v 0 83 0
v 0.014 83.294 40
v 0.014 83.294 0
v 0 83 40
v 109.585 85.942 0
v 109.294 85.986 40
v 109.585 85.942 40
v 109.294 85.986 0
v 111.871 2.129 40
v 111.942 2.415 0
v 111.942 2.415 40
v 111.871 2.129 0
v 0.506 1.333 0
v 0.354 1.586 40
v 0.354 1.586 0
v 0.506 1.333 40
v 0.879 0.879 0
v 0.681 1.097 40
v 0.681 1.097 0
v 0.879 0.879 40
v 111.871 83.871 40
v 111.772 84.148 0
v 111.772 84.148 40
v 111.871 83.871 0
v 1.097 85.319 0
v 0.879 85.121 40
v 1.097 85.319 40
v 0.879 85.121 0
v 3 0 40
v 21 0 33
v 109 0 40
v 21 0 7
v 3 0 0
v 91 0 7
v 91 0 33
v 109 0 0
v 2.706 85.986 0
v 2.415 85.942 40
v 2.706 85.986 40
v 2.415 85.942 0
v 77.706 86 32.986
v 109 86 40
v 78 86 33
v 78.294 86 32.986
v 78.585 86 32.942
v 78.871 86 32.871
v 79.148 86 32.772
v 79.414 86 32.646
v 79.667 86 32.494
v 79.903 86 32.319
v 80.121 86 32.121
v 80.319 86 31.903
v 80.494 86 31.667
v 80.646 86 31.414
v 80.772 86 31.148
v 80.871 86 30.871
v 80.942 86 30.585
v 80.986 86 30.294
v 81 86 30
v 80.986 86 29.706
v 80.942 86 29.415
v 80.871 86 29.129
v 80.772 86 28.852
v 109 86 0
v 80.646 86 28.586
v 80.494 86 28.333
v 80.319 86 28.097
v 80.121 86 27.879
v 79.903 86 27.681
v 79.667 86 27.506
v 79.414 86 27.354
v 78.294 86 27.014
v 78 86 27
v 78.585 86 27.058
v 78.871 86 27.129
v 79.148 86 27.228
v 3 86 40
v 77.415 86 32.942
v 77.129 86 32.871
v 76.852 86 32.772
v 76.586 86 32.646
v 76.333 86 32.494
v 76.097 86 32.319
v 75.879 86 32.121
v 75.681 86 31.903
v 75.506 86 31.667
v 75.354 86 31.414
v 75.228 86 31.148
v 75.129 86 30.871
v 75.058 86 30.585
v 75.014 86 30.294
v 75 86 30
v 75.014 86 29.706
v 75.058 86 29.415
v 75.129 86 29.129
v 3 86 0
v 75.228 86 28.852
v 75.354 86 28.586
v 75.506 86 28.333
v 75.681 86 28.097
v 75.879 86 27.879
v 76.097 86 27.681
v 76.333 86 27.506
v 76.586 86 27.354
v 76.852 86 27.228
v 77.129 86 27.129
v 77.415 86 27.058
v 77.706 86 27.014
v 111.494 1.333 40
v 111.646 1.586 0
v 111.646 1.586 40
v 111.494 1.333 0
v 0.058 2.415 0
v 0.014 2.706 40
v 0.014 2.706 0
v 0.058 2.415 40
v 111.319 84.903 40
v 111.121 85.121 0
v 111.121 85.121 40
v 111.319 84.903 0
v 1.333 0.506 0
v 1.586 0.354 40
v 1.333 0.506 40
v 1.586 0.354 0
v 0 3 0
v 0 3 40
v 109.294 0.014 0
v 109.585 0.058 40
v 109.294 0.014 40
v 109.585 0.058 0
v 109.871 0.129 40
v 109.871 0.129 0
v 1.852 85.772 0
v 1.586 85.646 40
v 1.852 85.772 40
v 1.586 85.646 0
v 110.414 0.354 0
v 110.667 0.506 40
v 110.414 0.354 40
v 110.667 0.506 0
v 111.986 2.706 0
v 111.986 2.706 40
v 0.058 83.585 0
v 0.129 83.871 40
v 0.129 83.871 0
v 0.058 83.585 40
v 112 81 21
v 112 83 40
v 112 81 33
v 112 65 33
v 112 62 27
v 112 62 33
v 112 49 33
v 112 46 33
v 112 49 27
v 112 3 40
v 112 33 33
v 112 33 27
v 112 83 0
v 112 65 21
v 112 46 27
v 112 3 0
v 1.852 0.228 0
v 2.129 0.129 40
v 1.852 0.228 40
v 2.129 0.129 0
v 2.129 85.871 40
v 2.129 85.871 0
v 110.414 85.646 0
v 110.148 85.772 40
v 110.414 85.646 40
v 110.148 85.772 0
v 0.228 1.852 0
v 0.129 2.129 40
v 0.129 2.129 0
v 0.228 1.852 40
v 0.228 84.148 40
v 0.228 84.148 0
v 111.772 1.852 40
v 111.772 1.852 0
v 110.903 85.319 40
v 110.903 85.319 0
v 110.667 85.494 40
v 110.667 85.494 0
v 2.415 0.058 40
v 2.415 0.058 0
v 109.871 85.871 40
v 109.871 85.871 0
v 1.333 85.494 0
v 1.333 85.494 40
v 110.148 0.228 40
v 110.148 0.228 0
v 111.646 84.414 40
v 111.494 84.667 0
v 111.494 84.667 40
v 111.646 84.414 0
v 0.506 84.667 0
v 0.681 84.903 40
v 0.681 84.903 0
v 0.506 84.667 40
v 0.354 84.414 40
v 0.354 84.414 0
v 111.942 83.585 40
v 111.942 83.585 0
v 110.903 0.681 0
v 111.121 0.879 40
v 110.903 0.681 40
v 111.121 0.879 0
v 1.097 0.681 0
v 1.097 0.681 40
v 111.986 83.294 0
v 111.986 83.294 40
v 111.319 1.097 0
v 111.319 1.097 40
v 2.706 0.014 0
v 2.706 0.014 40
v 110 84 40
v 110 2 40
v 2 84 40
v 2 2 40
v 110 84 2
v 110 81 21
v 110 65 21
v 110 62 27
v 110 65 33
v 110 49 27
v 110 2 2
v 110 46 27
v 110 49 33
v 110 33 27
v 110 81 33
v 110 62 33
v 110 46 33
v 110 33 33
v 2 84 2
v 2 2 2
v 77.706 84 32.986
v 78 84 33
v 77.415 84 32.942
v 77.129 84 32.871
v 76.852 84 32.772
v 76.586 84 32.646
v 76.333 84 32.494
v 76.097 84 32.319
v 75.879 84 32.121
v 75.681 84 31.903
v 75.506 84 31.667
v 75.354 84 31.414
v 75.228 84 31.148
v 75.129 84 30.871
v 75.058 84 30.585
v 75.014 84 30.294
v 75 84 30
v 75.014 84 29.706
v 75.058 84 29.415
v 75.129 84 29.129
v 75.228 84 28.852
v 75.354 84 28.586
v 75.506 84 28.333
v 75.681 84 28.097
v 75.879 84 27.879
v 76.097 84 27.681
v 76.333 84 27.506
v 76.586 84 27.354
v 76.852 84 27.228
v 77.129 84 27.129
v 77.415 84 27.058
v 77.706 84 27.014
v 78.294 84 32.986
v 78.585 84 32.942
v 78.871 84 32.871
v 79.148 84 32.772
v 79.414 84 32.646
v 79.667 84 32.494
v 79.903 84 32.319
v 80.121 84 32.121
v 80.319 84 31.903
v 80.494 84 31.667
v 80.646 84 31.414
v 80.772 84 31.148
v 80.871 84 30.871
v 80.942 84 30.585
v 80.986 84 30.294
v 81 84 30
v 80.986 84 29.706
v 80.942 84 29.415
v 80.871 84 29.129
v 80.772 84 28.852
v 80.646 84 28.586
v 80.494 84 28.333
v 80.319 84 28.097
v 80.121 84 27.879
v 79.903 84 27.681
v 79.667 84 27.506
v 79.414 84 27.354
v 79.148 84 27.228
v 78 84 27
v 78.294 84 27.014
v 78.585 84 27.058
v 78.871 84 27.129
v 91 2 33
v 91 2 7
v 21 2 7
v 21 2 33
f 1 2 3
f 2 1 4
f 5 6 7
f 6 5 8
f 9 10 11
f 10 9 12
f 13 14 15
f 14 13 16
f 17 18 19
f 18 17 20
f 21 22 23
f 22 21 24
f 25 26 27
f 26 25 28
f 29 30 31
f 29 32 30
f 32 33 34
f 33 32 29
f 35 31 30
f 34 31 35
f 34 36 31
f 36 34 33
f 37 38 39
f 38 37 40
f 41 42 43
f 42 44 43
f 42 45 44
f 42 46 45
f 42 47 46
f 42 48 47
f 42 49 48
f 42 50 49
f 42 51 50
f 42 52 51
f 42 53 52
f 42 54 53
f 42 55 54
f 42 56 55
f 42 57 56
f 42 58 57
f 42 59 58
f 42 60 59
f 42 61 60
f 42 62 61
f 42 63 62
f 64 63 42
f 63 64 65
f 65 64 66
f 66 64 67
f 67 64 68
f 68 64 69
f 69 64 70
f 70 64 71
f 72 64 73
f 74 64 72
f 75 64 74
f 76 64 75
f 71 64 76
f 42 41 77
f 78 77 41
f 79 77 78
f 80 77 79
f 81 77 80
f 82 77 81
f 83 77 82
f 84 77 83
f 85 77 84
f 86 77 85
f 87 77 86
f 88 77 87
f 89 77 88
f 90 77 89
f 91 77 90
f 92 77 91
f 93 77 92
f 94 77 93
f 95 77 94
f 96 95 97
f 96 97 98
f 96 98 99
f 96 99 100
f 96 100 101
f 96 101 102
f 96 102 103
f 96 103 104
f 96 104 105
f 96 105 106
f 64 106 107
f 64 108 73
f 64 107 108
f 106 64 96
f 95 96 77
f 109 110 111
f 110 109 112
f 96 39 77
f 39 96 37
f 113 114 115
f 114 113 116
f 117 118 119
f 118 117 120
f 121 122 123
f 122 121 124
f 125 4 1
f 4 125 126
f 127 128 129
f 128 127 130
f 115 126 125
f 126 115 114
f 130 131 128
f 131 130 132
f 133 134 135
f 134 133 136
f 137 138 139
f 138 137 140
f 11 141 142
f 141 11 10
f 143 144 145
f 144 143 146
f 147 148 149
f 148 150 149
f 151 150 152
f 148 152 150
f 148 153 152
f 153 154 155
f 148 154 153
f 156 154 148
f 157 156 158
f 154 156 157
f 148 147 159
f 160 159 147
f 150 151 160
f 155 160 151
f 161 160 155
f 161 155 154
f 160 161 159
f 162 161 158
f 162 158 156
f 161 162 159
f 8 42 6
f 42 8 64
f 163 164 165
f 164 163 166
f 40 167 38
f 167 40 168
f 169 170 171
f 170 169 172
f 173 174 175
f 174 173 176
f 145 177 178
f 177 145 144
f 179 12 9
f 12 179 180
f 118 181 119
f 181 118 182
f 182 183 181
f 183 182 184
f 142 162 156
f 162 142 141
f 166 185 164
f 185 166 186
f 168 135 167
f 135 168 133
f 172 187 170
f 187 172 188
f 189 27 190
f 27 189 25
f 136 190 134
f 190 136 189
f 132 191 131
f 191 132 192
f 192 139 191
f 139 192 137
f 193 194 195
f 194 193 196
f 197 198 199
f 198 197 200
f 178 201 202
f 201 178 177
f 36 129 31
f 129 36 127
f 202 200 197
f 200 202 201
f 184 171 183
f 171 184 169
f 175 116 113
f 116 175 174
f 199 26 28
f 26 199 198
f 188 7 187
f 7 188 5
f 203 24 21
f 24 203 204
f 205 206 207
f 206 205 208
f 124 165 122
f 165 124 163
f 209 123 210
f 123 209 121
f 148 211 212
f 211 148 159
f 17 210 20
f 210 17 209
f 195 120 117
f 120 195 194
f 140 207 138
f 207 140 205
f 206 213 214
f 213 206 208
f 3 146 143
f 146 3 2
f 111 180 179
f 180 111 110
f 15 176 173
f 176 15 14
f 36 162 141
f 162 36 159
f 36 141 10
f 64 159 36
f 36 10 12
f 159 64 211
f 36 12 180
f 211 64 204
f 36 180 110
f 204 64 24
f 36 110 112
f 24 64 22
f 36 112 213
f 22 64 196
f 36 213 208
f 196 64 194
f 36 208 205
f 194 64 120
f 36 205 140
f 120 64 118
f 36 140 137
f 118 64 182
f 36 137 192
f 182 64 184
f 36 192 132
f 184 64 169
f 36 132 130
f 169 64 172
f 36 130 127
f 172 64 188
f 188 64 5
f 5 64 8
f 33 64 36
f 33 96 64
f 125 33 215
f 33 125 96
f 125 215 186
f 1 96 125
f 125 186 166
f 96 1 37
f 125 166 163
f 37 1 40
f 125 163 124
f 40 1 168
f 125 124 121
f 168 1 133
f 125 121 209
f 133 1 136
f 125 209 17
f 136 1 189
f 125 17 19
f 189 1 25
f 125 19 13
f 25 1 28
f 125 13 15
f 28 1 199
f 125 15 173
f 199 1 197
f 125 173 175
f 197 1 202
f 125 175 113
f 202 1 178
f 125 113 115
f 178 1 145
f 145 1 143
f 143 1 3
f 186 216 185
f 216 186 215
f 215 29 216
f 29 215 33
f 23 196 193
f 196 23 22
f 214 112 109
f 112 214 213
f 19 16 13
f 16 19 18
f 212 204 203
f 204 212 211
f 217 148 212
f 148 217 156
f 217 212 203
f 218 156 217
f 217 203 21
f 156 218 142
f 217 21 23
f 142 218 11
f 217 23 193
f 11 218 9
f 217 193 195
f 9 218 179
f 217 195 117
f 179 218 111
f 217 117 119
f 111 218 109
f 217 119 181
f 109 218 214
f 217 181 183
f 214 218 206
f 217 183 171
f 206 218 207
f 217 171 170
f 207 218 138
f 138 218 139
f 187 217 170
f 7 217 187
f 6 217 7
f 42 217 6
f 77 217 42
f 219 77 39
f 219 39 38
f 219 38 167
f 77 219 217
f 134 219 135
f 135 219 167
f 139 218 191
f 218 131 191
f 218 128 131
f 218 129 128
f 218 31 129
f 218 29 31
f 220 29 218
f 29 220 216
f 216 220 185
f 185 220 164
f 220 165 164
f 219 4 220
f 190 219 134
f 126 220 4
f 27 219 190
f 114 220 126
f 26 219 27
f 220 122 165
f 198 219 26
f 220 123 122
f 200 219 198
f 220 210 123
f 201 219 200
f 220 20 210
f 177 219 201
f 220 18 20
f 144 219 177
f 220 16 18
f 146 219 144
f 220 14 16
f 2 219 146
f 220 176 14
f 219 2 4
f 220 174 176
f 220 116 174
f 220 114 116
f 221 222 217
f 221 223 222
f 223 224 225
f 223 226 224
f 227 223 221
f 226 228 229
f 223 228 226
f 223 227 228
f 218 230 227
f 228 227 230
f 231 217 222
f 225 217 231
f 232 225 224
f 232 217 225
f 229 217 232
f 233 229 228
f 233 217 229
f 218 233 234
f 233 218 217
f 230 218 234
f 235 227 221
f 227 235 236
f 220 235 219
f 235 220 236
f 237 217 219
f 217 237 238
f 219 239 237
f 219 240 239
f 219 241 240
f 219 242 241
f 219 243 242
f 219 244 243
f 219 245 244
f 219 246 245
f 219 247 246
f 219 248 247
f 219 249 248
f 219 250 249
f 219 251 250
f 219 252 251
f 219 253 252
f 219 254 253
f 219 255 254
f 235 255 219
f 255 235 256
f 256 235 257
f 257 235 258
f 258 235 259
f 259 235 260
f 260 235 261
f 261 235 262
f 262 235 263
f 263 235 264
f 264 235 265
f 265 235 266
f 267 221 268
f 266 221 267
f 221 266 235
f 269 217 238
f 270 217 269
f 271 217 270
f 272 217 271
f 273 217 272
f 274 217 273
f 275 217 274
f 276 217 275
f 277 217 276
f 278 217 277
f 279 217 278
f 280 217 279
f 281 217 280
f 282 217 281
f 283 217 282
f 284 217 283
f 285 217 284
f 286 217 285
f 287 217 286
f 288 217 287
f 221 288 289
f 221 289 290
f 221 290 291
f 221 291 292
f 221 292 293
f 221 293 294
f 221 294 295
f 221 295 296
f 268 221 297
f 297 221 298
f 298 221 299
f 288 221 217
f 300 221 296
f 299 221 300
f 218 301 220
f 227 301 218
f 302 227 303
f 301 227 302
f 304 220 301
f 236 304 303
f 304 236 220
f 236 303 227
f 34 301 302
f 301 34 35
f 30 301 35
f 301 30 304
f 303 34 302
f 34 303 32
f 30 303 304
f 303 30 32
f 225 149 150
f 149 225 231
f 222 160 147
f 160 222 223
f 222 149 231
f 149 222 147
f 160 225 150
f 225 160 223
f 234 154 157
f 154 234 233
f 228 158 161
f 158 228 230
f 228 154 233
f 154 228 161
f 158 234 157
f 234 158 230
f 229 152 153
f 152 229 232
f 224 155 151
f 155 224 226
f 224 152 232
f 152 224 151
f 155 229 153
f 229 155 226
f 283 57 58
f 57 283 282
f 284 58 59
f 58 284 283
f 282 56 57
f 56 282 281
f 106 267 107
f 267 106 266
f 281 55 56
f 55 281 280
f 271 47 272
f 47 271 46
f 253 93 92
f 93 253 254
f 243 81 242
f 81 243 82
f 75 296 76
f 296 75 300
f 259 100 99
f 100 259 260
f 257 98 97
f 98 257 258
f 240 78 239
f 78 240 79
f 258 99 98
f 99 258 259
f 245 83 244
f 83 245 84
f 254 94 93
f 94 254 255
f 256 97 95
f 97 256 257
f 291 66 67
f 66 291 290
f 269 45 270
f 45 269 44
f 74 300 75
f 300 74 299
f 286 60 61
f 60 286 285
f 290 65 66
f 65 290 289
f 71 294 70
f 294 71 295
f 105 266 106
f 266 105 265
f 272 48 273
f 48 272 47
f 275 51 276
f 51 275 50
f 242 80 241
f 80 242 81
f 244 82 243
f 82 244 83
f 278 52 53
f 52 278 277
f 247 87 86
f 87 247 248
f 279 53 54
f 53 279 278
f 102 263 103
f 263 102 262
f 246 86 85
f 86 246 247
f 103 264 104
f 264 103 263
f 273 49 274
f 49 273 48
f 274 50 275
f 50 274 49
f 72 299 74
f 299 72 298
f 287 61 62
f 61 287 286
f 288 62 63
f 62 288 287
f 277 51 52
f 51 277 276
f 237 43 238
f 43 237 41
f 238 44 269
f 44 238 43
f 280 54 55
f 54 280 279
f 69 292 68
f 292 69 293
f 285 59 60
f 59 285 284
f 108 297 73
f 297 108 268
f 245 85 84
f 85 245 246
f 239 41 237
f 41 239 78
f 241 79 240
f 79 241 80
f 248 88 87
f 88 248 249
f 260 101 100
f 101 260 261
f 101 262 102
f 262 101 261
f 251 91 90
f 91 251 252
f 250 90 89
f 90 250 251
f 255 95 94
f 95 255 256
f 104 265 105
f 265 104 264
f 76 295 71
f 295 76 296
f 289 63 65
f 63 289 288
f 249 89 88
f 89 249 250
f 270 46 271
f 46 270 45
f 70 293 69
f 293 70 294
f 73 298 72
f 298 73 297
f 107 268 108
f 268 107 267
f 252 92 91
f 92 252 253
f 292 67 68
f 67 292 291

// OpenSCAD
//number of fragments
$fn=64;

difference(){
    // outer shell
    roundedcube(112,86,40,3);

    // internal cavity
    translate ([2,2,2]){
        cube ([108,82,40]) ;
    }

    // oled window
    translate ([21,-1,7]) {
        cube ([70,4,26]) ;
    }

    // ethernet
    translate ([109,65,21]){
        cube ([4,16,12]) ;
    }

    // usb ports
    translate([109, 33, 27]){
        cube ([4,13,6]) ;
    }
    translate([109, 49, 27]){
        cube ([4,13,6]) ;
    }

    // A/V jack
    translate([78,87,30]){
        rotate([90,0,0]){
            cylinder(h=4,r=3);
        }
    }
}

module roundedcube(xdim,ydim,zdim,rdim){
    hull(){
        translate([rdim,rdim,0])cylinder(r=rdim,h=zdim);
        translate([xdim-rdim,rdim,0])cylinder(r=rdim,h=zdim);
        translate([rdim,ydim-rdim,0])cylinder(r=rdim,h=zdim);
        translate([xdim-rdim,ydim-rdim,0])cylinder(r=rdim,h=zdim);
    }
}
